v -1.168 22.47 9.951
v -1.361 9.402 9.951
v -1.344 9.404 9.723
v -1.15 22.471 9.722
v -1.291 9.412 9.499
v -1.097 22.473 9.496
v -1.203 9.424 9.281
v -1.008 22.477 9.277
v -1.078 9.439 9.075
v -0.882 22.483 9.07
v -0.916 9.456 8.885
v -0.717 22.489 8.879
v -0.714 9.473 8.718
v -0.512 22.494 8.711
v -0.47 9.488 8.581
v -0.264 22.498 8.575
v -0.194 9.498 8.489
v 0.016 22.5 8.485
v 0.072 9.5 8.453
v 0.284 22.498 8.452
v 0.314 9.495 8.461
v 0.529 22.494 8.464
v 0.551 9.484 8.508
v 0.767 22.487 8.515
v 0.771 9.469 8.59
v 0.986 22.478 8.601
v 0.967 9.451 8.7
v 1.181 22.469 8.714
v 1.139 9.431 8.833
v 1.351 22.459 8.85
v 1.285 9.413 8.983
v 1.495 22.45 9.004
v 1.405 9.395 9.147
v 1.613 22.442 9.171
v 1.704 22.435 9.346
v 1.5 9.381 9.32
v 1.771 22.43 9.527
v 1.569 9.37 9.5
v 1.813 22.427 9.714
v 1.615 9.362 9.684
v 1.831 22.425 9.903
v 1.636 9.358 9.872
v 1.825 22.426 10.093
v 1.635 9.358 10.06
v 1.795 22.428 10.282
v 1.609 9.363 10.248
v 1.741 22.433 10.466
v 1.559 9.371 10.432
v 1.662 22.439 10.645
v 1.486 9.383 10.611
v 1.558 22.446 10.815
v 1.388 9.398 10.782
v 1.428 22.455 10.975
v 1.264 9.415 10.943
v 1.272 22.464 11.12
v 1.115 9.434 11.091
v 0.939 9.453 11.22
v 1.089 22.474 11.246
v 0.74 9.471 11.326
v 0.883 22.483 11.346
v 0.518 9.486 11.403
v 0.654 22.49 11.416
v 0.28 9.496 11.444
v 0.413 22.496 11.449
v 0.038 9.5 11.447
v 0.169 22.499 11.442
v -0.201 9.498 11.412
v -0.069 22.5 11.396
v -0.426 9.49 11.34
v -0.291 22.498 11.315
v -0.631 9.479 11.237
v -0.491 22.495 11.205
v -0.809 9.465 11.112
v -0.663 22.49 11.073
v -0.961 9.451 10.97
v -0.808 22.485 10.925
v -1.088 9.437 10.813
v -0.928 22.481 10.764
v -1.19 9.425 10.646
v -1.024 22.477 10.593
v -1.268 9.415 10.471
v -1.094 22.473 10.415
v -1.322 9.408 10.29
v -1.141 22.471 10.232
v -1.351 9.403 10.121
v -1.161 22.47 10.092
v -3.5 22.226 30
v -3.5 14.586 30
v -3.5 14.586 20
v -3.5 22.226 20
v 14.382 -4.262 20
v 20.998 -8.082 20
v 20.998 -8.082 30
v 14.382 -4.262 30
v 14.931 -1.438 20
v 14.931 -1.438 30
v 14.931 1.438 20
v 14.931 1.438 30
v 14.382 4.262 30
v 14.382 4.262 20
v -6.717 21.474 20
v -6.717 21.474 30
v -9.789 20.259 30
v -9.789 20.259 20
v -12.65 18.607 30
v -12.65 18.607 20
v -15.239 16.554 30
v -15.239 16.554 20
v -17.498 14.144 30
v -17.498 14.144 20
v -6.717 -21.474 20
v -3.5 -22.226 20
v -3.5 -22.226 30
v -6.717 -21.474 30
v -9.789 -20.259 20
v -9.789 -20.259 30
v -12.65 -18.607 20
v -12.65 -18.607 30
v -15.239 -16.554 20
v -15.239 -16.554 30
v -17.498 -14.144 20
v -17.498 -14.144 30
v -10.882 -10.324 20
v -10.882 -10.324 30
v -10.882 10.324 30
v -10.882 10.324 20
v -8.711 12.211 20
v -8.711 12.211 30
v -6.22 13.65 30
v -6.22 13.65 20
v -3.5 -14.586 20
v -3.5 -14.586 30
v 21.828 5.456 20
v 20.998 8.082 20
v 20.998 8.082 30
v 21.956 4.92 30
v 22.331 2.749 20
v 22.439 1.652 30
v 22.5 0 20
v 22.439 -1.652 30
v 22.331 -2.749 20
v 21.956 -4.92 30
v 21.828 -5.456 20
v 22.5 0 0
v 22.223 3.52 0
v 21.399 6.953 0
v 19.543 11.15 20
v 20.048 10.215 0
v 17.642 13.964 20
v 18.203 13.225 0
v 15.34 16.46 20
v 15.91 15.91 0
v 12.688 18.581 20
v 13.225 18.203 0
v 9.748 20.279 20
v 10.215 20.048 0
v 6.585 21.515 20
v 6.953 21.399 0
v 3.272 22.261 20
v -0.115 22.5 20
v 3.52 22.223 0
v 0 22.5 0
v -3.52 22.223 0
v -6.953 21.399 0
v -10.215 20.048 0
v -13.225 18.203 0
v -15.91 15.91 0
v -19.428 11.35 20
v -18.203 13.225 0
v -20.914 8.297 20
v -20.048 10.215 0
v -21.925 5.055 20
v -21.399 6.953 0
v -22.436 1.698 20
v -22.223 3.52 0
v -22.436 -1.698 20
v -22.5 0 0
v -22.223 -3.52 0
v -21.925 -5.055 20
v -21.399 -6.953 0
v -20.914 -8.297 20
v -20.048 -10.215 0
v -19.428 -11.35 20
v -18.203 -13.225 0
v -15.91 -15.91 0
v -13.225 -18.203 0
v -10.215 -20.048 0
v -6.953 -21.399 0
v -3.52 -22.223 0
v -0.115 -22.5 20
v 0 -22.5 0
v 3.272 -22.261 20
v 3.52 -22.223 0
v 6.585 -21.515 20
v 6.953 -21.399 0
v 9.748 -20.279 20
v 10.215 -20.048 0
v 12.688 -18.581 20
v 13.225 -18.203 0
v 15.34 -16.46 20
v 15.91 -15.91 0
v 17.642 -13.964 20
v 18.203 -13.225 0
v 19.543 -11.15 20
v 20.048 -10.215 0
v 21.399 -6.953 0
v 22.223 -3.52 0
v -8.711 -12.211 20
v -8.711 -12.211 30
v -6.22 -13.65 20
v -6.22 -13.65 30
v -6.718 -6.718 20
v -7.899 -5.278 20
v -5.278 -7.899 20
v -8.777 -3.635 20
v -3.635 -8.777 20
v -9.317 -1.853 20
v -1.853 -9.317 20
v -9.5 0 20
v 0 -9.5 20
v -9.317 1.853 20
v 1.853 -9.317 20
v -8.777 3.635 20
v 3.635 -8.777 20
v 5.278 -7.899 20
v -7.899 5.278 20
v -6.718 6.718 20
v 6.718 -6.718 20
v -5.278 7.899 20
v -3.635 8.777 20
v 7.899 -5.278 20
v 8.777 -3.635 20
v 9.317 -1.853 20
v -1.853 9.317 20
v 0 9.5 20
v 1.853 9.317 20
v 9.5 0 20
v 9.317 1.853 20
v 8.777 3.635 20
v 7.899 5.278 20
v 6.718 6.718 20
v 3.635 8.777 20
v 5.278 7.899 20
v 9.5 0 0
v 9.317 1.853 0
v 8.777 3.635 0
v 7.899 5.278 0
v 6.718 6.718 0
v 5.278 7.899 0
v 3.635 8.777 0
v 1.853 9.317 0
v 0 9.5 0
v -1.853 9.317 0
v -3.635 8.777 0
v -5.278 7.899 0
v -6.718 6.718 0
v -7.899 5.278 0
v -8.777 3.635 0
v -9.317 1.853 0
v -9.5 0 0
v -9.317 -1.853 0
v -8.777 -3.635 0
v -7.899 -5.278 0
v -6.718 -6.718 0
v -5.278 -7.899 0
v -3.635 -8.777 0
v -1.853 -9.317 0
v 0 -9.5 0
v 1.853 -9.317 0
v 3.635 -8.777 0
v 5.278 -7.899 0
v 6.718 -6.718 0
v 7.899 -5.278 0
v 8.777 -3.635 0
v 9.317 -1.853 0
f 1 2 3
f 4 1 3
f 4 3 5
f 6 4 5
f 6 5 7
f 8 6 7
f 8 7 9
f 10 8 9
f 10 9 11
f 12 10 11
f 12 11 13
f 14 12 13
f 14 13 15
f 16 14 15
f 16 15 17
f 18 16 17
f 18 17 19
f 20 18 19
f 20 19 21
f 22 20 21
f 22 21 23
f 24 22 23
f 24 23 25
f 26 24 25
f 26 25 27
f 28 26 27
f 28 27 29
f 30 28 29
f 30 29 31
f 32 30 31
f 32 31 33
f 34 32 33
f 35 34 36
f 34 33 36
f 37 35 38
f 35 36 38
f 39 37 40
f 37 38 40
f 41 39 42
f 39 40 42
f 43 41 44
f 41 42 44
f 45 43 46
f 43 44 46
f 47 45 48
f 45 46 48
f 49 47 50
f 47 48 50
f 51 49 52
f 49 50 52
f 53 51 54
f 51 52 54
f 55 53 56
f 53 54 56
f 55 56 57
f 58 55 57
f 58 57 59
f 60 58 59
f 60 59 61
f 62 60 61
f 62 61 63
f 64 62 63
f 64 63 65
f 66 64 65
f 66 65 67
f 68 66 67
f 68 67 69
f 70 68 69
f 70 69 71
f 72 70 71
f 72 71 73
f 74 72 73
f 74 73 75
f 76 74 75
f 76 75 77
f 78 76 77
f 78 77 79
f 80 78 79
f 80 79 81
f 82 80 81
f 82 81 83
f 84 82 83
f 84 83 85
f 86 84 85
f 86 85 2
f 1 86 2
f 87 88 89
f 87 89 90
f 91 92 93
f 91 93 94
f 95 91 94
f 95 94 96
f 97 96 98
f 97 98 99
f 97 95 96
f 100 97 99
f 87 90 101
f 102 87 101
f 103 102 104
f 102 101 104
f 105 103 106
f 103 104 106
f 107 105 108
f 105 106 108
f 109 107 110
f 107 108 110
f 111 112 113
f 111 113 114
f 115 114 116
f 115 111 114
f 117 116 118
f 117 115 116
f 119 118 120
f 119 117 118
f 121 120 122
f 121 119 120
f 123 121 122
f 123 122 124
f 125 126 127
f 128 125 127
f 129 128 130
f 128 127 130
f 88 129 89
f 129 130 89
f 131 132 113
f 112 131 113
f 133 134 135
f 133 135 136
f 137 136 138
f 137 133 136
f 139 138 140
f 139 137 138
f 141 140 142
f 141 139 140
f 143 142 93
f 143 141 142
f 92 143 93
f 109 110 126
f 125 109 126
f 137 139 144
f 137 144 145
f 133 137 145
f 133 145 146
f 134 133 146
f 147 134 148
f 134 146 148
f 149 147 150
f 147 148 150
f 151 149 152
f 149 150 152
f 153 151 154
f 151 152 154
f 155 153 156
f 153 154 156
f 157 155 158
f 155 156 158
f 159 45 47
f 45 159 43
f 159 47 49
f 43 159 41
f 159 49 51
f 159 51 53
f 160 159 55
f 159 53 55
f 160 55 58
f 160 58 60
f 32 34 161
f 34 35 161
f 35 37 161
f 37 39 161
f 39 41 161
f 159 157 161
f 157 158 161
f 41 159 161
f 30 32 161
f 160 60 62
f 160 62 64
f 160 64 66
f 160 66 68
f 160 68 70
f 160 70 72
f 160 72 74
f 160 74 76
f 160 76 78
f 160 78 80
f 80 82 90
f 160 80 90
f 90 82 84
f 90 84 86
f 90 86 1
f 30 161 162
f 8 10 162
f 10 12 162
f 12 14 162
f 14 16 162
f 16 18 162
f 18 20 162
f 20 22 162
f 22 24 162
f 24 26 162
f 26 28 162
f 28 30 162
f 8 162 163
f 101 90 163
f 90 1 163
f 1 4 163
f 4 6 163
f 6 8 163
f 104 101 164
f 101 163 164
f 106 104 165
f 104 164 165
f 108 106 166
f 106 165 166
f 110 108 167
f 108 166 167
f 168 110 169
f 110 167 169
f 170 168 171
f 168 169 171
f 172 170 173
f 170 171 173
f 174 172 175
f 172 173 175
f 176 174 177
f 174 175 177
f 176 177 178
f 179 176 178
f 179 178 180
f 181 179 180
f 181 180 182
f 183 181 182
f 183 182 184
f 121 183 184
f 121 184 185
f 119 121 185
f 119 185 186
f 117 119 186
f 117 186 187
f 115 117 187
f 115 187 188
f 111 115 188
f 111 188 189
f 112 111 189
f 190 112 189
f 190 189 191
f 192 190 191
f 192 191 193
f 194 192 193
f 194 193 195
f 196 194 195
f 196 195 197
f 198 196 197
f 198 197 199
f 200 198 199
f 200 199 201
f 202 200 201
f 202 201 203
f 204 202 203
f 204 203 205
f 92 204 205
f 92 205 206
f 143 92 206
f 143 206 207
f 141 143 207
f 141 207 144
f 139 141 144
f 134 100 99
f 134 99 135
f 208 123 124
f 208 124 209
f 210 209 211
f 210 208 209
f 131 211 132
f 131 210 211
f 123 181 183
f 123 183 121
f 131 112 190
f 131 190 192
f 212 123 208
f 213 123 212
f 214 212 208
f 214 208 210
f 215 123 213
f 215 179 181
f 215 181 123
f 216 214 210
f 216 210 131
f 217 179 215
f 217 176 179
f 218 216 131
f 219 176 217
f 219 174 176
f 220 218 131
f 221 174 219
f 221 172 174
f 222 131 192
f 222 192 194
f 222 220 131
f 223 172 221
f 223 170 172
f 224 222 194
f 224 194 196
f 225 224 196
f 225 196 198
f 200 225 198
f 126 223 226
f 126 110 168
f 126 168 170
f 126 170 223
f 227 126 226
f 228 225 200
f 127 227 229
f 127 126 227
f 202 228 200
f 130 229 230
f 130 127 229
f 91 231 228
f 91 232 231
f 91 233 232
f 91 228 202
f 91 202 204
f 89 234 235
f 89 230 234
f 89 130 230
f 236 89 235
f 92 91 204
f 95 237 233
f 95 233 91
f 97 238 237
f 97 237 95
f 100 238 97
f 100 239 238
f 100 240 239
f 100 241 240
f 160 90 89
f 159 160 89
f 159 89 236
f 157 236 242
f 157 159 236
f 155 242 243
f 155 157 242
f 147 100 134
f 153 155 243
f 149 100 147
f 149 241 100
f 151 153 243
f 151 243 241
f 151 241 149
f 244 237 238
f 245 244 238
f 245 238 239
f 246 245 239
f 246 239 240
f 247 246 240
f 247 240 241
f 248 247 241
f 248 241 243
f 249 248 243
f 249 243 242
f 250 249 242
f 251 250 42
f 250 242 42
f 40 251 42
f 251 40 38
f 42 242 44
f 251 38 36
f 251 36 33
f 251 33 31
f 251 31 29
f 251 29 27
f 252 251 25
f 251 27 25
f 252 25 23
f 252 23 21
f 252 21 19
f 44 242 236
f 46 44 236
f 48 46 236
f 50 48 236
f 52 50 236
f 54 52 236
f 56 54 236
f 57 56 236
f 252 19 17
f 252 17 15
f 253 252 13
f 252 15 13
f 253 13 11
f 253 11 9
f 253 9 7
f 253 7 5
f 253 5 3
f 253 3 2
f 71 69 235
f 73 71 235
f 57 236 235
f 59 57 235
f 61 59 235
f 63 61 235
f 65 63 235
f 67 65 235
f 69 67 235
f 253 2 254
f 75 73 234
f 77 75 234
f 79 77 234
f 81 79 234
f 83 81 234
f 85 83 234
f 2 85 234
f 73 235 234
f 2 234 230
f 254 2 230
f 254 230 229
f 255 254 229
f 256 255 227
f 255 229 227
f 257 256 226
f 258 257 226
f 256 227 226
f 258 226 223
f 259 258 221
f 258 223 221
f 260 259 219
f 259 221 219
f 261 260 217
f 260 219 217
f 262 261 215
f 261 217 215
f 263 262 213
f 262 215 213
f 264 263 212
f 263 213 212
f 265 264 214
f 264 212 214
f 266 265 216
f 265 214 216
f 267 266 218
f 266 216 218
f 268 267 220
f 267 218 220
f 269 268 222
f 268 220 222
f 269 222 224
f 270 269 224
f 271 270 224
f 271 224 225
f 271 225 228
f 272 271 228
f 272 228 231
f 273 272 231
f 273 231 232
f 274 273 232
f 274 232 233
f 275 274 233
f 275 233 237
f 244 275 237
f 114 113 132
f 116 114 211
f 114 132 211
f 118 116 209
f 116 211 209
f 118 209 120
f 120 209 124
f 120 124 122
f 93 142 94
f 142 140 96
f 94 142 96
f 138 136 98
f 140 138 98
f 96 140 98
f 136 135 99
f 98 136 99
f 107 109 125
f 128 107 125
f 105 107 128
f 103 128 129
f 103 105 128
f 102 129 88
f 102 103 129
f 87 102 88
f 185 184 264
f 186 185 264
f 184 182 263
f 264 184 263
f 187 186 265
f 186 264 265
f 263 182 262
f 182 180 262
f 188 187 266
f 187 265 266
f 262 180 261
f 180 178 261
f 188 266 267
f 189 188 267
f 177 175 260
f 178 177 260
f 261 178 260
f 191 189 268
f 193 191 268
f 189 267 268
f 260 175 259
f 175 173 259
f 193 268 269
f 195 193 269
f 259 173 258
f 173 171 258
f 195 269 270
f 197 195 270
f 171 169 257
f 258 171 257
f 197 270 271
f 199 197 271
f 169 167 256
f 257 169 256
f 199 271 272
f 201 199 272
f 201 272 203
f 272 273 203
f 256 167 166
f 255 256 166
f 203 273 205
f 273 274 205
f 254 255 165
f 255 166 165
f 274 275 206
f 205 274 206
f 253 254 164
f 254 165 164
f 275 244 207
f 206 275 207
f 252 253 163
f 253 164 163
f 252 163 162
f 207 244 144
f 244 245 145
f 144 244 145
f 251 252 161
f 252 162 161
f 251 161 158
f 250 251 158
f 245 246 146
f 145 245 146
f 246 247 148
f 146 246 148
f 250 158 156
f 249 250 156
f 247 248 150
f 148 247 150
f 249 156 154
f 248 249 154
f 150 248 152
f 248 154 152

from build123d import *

# Parameters (mm, degrees)
SKETCH1_R                 = 22.5
BOSS_EXTRUDE1_DEPTH       = 20
CUT_EXTRUDE1_REACH        = 22
SKETCH3_R                 = 9.5
F_3_0MM_DOWEL_HOLE1_D     = 3
F_3_0MM_DOWEL_HOLE1_DEPTH = 22
F_3_0MM_DOWEL_HOLE1_TIP   = 0.901291
BOSS_EXTRUDE3_DEPTH       = 10


with BuildPart() as part:
    # Sketch1 → Boss-Extrude1 (new body)
    with BuildSketch(Plane.XY):
        Circle(SKETCH1_R)
    extrude(amount=BOSS_EXTRUDE1_DEPTH)

    # Sketch3 → Cut-Extrude1 (cut, up to next)
    with BuildSketch(Plane.XY.offset(20), mode=Mode.PRIVATE) as cut_extrude1_sk1:
        Circle(SKETCH3_R)
    cut_extrude1_tool1 = extrude(cut_extrude1_sk1.sketch, amount=-CUT_EXTRUDE1_REACH, mode=Mode.PRIVATE) & part.part
    add(cut_extrude1_tool1.solids().sort_by_distance((0, 0, 20))[0], mode=Mode.SUBTRACT)

    # Ø3.0mm Dowel Hole1
    with Locations(Plane(origin=(0.332625, 22.497541, 9.950984), x_dir=(0.999891, -0.014783, 0), z_dir=(0.014783, 0.999891, 0))):
        with Locations((0, 0)):
            Hole(F_3_0MM_DOWEL_HOLE1_D / 2, depth=F_3_0MM_DOWEL_HOLE1_DEPTH)
            with Locations((0, 0, -(F_3_0MM_DOWEL_HOLE1_DEPTH + F_3_0MM_DOWEL_HOLE1_TIP / 2))):  # 118° drill point
                Cone(0, F_3_0MM_DOWEL_HOLE1_D / 2, F_3_0MM_DOWEL_HOLE1_TIP, mode=Mode.SUBTRACT)

    # Sketch6 → Boss-Extrude3 (add)
    with BuildSketch(Plane.XY.offset(20)):
        with BuildLine():
            Line((-17.498377, 14.144144), (-10.881805, 10.324065))
            ThreePointArc((-10.881805, 10.324065), (-7.5, 12.990381), (-3.5, 14.585952))
            Line((-3.5, 14.585952), (-3.5, 22.226111))
            ThreePointArc((-3.5, 22.226111), (-11.25, 19.485572), (-17.498377, 14.144144))
        make_face()
        with BuildLine():
            Line((14.381805, 4.261887), (20.998377, 8.081966))
            ThreePointArc((20.998377, 8.081966), (22.5, 0), (20.998377, -8.081966))
            Line((20.998377, -8.081966), (14.381805, -4.261887))
            ThreePointArc((14.381805, -4.261887), (15, 0), (14.381805, 4.261887))
        make_face()
        with BuildLine():
            Line((-3.5, -14.585952), (-3.5, -22.226111))
            ThreePointArc((-3.5, -22.226111), (-11.25, -19.485572), (-17.498377, -14.144144))
            Line((-17.498377, -14.144144), (-10.881805, -10.324065))
            ThreePointArc((-10.881805, -10.324065), (-7.5, -12.990381), (-3.5, -14.585952))
        make_face()
    extrude(amount=BOSS_EXTRUDE3_DEPTH)


solid = part.part
